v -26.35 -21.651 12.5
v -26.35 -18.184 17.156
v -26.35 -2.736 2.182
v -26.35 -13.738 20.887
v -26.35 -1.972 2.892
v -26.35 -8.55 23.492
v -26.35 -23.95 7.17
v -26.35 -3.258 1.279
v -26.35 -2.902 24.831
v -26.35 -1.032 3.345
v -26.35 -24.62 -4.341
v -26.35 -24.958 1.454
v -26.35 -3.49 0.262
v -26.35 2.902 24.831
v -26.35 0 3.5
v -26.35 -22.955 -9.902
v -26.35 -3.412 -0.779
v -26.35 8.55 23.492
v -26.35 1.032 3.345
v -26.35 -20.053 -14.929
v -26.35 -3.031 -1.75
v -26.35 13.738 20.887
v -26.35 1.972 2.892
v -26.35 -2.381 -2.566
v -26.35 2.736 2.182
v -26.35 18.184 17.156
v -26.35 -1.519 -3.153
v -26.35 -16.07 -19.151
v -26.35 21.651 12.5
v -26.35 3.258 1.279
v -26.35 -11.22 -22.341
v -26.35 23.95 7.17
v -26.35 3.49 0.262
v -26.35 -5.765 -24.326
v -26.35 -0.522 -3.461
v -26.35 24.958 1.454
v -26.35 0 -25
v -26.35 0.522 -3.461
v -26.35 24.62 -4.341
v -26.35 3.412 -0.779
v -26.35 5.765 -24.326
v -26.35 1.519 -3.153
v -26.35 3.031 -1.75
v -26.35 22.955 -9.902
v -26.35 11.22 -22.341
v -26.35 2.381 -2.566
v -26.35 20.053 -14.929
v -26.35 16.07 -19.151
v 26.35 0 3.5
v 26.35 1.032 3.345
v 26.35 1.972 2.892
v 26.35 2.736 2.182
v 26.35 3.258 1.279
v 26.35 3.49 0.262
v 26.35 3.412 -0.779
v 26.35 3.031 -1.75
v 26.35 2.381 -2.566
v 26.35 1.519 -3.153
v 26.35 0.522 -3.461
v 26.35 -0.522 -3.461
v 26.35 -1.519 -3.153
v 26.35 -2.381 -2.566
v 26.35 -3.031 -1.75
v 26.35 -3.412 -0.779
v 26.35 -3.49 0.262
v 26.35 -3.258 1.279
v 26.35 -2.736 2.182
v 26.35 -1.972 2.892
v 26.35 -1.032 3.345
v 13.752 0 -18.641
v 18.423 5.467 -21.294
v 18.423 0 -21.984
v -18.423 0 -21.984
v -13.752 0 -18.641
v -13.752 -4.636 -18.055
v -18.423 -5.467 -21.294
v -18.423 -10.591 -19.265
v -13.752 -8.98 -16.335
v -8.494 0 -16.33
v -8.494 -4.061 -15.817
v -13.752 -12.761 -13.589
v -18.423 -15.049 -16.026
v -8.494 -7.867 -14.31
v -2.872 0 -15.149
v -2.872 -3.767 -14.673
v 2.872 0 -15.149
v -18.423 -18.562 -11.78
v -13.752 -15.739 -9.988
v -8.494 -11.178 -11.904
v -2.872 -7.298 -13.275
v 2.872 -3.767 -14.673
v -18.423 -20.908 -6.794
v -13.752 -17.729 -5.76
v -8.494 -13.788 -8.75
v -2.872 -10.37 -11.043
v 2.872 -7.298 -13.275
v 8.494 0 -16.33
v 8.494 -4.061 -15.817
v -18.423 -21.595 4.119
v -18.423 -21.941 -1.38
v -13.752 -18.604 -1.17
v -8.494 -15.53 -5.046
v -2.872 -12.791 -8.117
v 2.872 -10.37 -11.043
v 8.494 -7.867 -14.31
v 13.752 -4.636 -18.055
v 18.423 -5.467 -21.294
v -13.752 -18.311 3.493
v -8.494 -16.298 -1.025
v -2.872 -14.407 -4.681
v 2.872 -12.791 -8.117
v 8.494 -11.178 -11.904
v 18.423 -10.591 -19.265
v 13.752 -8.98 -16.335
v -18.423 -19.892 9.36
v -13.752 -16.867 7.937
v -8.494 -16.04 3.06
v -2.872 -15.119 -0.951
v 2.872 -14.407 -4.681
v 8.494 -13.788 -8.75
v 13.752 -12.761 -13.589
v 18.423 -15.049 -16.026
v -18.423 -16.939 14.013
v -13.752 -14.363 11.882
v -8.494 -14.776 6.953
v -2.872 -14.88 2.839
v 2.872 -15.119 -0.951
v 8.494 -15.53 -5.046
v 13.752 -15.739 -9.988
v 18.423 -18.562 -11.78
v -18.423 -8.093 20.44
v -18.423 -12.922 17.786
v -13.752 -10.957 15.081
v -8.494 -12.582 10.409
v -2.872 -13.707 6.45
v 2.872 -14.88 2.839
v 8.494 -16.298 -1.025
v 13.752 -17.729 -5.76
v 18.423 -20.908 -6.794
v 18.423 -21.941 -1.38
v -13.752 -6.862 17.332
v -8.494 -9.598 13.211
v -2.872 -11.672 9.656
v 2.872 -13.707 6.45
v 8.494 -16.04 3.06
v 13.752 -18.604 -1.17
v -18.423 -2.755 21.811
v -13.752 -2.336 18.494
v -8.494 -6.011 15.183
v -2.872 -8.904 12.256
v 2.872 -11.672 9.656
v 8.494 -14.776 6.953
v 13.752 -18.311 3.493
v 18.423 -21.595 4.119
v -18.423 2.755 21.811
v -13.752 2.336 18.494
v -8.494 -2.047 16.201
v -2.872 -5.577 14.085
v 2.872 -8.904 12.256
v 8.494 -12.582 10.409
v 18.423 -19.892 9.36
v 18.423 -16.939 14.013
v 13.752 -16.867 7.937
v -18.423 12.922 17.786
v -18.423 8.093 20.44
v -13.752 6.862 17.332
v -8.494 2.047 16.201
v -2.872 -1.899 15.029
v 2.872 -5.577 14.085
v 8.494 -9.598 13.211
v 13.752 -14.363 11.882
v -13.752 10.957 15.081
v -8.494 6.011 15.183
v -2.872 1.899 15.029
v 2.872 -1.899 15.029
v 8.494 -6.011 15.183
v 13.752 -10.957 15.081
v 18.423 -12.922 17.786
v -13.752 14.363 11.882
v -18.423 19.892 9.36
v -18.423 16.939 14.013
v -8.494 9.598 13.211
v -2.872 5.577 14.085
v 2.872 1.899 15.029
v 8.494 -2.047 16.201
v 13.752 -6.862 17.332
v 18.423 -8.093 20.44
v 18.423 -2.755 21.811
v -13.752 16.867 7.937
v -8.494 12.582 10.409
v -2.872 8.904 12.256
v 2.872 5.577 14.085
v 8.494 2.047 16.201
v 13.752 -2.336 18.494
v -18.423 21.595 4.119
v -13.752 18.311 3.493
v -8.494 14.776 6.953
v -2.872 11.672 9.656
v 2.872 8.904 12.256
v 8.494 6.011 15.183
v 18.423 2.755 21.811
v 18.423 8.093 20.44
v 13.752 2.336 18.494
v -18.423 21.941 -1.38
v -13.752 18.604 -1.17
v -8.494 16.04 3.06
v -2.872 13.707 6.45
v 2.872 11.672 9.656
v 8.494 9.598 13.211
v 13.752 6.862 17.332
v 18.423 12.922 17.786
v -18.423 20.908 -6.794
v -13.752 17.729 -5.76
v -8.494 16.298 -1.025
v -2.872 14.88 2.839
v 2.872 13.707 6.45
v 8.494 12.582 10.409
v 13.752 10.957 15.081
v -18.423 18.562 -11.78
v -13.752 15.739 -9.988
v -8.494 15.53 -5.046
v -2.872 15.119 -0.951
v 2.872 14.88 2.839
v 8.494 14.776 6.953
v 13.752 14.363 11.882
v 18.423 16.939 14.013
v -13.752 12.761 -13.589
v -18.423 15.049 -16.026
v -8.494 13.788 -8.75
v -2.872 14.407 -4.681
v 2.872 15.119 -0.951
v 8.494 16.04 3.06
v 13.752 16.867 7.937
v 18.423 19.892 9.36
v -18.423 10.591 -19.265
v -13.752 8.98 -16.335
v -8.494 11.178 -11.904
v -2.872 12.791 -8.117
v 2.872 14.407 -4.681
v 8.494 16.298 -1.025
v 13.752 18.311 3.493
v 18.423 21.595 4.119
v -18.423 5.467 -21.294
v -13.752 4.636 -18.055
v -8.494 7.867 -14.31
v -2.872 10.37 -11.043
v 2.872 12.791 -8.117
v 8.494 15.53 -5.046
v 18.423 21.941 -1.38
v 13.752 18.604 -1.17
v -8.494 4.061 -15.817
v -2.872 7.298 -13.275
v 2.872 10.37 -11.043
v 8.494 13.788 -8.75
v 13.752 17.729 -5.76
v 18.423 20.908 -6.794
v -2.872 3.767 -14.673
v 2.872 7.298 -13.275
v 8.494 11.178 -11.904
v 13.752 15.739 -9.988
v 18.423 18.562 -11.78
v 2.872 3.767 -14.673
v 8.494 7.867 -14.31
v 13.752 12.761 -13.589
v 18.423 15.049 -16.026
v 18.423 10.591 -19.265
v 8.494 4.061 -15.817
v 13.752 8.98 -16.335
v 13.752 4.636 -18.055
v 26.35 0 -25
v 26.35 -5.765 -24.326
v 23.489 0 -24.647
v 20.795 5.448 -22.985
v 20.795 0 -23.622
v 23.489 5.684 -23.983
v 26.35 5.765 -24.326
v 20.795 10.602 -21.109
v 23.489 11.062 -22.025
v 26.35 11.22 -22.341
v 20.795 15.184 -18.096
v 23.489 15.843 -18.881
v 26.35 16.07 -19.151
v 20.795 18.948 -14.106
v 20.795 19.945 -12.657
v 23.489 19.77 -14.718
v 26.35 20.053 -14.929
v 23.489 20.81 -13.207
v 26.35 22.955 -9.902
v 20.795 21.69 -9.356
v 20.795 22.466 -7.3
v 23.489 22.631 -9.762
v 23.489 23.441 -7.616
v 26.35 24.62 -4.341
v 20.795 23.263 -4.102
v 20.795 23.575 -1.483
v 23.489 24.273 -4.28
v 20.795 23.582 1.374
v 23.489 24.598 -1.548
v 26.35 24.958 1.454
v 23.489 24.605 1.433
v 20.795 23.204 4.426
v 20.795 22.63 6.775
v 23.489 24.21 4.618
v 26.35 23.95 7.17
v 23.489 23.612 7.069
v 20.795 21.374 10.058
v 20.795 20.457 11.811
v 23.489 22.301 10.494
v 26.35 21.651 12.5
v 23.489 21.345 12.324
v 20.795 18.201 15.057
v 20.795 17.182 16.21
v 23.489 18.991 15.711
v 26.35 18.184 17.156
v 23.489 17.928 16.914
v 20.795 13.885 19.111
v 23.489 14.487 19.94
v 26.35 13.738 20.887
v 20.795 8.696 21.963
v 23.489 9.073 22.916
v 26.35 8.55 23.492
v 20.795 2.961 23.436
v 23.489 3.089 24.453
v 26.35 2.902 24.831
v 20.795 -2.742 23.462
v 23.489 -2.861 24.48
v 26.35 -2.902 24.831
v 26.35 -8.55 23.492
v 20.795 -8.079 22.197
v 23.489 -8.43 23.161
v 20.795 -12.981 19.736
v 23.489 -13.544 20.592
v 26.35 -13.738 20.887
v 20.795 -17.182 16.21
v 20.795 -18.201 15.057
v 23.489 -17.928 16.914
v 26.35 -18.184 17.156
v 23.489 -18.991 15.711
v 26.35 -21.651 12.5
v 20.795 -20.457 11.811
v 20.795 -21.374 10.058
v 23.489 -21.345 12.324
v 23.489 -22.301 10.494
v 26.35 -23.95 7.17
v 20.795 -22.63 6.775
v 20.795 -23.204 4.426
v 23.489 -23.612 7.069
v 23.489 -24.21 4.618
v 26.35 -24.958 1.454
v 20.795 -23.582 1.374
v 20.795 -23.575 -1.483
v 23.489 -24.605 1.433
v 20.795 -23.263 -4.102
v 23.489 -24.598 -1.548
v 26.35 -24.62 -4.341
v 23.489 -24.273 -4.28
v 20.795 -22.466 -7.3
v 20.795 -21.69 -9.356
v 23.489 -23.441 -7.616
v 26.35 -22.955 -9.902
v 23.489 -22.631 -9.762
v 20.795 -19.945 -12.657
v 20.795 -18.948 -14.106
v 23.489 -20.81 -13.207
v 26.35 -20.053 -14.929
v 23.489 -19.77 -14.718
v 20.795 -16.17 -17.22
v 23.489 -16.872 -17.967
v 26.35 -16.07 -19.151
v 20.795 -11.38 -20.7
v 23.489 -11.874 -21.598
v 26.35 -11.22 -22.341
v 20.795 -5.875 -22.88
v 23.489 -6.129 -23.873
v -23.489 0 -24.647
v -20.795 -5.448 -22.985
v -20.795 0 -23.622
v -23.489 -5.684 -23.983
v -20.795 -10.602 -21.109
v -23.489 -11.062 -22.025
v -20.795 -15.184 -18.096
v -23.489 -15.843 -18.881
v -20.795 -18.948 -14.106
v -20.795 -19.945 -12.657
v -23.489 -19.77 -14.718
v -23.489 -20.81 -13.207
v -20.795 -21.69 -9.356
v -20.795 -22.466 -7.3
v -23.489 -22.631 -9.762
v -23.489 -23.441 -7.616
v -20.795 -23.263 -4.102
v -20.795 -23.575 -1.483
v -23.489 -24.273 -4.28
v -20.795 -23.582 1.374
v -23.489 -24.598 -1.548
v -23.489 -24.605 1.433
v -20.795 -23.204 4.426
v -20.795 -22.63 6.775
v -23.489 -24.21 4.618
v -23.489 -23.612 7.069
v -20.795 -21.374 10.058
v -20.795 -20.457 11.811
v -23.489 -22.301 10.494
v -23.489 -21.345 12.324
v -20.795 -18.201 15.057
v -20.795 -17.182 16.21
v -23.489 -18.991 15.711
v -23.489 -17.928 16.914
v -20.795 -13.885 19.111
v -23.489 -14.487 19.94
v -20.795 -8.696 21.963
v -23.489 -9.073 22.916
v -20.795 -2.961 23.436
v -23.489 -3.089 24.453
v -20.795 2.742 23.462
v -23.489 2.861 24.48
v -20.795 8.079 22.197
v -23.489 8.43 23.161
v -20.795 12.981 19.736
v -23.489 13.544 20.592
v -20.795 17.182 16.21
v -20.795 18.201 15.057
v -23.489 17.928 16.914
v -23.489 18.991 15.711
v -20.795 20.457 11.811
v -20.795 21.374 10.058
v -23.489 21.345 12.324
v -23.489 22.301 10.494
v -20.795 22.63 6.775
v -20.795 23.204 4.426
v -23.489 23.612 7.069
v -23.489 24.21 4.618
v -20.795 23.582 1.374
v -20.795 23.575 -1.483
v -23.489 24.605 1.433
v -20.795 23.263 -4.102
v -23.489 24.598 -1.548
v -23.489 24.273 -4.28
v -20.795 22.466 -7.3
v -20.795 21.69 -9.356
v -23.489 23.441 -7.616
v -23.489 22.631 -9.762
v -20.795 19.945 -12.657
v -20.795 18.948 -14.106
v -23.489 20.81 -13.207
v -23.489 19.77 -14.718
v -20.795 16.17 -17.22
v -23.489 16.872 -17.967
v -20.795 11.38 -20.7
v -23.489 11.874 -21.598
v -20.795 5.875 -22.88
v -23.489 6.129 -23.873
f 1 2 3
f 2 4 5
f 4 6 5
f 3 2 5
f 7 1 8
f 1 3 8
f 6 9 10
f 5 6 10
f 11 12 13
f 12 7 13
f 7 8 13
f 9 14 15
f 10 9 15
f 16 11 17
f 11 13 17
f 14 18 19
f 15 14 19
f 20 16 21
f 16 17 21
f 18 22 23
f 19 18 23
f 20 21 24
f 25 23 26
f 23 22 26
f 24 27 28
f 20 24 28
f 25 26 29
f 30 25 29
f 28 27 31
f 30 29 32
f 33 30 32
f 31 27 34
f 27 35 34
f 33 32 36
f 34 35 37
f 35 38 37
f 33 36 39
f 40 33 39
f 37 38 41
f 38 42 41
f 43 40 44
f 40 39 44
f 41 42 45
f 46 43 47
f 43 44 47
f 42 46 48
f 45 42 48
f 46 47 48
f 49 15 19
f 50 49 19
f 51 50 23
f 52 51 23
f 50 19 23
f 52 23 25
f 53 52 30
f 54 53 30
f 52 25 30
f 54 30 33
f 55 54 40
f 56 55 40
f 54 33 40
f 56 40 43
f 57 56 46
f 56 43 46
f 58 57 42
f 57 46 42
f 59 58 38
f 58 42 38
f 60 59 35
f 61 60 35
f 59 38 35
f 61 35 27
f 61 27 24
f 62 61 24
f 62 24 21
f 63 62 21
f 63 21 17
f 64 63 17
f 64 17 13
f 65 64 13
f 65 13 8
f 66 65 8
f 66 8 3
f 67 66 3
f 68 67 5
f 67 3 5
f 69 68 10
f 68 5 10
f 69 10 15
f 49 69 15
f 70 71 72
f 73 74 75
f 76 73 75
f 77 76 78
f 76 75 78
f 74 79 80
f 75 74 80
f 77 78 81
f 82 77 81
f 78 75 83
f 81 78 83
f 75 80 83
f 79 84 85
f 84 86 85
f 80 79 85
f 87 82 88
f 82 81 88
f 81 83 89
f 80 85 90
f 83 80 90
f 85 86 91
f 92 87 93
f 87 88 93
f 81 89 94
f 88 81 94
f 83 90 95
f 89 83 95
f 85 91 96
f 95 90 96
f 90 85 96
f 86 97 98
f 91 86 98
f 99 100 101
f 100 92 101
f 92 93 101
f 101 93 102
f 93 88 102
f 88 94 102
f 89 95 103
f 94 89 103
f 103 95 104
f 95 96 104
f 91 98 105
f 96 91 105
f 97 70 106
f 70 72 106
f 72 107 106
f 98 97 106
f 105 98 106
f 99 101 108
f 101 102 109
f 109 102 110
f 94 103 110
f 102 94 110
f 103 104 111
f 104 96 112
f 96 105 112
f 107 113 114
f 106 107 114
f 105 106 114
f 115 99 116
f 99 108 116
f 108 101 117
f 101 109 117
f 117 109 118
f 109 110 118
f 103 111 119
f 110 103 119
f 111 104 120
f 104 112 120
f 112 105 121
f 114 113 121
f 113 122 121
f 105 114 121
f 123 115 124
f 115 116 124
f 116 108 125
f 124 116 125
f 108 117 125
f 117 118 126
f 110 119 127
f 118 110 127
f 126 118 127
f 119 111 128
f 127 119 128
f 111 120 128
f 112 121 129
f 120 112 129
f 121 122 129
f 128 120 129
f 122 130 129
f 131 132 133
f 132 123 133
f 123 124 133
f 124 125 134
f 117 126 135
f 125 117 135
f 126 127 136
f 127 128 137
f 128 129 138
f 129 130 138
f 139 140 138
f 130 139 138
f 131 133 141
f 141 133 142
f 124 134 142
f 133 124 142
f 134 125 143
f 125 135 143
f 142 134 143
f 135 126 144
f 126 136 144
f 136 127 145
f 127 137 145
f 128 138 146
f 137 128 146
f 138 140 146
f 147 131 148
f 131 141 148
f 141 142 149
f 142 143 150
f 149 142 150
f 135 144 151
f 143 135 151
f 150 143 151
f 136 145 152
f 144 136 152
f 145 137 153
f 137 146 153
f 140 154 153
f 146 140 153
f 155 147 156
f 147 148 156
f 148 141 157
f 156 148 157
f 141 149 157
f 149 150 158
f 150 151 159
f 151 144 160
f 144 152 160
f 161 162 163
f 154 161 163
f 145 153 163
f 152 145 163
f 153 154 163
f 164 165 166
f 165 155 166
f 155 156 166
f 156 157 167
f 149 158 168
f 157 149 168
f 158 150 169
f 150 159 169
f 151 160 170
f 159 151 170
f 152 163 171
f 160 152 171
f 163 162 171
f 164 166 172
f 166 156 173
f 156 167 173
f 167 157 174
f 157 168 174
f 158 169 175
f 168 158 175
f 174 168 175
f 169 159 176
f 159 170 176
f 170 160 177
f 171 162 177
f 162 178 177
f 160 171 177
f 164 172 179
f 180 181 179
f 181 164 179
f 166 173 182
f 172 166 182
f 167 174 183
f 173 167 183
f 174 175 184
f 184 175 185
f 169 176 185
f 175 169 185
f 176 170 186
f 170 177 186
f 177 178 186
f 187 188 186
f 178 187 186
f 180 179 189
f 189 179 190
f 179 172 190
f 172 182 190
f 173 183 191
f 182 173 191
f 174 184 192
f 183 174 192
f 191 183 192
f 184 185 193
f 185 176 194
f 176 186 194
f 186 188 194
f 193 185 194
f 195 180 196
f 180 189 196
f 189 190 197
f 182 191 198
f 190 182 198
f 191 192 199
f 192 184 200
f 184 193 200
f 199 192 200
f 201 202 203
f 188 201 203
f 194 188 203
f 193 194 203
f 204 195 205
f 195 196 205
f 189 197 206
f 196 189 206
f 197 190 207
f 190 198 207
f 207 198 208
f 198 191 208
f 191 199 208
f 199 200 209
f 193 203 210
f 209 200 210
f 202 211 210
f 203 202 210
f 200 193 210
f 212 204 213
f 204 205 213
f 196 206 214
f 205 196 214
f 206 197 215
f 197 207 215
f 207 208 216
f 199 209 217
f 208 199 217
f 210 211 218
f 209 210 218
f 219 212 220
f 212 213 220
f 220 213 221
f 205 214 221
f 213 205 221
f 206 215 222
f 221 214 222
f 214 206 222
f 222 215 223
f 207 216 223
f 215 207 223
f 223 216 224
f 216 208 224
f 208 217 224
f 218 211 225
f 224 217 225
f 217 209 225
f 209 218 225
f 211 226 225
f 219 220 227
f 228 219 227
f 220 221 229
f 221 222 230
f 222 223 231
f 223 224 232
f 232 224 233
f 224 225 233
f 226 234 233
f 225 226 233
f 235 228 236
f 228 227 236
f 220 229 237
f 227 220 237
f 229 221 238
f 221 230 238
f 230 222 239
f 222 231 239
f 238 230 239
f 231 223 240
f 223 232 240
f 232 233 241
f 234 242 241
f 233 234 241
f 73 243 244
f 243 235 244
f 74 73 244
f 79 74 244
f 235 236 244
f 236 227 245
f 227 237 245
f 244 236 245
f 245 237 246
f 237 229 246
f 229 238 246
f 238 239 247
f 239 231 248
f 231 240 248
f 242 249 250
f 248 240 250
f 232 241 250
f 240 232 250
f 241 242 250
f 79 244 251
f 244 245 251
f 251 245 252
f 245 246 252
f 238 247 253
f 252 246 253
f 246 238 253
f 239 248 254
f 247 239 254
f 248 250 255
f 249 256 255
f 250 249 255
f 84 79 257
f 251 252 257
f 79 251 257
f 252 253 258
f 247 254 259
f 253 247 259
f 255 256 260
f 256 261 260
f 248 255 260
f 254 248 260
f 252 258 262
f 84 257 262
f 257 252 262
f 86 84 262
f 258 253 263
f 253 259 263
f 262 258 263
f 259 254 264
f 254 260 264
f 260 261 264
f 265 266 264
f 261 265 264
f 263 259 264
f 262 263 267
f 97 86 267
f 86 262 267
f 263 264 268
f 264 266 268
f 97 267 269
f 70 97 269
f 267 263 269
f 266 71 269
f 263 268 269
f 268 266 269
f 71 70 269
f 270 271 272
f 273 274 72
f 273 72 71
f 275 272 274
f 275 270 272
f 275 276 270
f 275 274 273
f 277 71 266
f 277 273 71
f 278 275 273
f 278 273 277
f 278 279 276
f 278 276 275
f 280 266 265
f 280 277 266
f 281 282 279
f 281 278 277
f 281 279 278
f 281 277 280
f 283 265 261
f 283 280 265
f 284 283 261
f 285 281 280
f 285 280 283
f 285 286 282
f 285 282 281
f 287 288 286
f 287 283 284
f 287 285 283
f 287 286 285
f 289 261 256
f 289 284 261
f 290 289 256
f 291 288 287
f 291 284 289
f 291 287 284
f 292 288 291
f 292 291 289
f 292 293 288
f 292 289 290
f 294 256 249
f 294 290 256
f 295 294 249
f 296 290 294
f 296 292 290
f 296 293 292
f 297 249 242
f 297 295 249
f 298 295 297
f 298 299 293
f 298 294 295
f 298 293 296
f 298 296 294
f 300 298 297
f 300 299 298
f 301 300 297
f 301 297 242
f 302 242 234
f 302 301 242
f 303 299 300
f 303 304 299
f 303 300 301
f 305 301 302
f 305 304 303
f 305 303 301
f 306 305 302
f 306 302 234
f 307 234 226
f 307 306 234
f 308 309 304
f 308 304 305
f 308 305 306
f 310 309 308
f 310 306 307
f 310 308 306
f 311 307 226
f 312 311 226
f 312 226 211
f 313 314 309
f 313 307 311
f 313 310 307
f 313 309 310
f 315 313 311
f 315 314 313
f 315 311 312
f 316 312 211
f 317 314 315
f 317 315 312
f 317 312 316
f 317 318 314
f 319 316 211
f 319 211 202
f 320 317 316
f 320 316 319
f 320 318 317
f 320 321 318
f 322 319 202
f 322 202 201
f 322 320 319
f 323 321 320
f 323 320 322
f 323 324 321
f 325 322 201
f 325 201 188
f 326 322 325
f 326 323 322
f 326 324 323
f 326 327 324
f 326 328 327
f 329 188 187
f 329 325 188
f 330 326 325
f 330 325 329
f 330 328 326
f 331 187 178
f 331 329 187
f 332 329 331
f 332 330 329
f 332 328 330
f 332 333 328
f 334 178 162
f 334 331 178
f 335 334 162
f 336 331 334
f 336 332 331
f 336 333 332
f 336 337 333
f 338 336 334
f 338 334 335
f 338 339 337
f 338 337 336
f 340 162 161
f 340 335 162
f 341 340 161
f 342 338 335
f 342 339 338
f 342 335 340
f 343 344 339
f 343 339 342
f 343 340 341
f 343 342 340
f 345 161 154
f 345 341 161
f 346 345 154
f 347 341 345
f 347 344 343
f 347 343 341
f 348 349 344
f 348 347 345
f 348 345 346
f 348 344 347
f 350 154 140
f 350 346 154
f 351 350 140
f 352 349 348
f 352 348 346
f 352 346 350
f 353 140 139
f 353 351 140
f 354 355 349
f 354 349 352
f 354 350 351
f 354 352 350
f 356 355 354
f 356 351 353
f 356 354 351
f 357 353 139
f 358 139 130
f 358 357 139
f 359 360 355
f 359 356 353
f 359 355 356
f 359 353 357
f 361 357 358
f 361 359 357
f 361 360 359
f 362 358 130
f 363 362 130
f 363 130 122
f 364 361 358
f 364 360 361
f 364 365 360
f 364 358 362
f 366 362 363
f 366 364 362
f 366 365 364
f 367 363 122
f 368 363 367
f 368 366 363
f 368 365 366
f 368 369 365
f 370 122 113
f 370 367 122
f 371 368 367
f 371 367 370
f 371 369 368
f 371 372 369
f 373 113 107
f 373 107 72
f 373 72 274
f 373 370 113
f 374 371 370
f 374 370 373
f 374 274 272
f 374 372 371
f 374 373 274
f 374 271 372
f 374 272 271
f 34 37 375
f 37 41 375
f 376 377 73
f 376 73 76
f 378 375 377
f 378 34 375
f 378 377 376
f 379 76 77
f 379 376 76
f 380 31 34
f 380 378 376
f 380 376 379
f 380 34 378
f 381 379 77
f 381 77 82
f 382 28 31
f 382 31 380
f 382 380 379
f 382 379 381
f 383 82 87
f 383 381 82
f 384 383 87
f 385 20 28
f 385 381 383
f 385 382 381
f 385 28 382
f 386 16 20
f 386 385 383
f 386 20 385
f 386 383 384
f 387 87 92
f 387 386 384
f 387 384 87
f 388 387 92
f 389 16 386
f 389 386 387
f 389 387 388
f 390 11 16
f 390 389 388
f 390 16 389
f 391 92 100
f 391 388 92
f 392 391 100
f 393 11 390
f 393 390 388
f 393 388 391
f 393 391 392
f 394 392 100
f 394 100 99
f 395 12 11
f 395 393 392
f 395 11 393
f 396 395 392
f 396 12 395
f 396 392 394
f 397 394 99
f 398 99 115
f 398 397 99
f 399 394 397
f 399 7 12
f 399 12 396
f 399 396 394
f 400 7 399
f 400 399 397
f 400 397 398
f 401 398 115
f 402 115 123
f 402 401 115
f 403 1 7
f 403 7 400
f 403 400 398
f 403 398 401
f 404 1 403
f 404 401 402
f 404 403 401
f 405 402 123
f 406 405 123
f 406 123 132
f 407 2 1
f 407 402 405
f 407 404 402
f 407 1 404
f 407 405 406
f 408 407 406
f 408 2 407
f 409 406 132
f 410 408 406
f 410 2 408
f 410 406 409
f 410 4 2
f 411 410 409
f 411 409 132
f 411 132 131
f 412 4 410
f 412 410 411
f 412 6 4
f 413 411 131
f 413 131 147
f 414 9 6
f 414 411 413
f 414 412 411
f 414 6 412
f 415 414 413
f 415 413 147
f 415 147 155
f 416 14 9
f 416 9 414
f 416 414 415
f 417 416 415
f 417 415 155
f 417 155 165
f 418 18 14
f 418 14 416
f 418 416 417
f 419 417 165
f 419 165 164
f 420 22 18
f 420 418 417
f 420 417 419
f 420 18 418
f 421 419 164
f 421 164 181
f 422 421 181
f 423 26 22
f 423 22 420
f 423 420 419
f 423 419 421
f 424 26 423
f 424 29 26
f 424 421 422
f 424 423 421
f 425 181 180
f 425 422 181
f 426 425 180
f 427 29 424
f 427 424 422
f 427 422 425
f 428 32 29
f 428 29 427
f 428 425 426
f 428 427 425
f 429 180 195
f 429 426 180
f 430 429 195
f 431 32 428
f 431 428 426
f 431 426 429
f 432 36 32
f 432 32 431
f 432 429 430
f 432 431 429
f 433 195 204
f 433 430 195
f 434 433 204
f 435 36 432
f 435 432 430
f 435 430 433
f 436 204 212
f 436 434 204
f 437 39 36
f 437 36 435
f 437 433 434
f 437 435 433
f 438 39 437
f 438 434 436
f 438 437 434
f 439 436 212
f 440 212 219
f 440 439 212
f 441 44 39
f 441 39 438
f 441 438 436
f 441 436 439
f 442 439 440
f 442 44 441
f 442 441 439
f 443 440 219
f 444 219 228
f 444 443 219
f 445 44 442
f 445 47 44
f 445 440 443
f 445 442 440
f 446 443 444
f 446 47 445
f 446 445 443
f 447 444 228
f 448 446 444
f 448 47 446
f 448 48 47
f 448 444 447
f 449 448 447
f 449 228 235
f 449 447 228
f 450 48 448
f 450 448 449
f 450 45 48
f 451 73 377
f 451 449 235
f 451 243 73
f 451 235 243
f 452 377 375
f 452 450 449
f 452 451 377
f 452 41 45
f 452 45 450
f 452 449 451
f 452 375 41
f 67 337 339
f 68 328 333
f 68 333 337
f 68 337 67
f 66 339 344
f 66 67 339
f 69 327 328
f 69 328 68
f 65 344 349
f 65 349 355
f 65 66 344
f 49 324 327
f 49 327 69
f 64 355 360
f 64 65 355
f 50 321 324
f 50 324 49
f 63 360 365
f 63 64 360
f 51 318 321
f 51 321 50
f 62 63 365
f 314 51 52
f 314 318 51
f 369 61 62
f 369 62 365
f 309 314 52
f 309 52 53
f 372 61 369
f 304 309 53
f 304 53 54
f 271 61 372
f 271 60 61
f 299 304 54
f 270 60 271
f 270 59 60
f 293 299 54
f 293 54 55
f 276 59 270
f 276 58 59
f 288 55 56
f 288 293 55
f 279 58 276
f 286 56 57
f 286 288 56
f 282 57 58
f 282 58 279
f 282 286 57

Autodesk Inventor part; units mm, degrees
ref_plane "YZ Plane" through (0, 0, 0) normal (1, 0, 0) x (0, 1, 0)
ref_plane "XZ Plane" through (0, 0, 0) normal (0, 1, 0) x (-1, 0, 0)
ref_plane "XY Plane" through (0, 0, 0) normal (0, 0, 1) x (1, 0, 0)
sketch "Sketch1" plane through (0, 0, 0) normal (0, 1, 0) x (-1, 0, 0)
  line L0 (21.35, -25) -> (26.35, -25)
  line L1 (-21.35, -25) -> (-26.35, -25)
  arc A0 (21.35, -25) -> (-21.35, -25) centre (0, -42.7911) ccw
  line L2 (26.35, 0) -> (-26.35, 0)
  line L3 (-26.35, 0) -> (-26.35, -25)
  line L4 (26.35, 0) -> (26.35, -25)
  point P0 (0, 0)
  dimension "d2" = 5
  dimension "d4" = 5
revolve "Revolution1" add sketch "Sketch1" angle 360 about axis through (-26.35, 0, 0) along (1, 0, 0)
sketch "Sketch2" plane through (-26.35, 0, 0) normal (-1, 0, 0) x (0, 0, 1)
  circle A0 centre (0, 0) radius 25 projected
  circle A1 centre (0, 0) radius 3.5
  dimension "d8" = 7
extrude "Extrusion1" cut sketch "Sketch2" against normal blind 52.7 contours A1
fillet "Fillet2" radius 12 2 edges at (-21.35, 0, 25) (21.35, 0, 25)
properties part number "vystuha_hridel_nahore"
